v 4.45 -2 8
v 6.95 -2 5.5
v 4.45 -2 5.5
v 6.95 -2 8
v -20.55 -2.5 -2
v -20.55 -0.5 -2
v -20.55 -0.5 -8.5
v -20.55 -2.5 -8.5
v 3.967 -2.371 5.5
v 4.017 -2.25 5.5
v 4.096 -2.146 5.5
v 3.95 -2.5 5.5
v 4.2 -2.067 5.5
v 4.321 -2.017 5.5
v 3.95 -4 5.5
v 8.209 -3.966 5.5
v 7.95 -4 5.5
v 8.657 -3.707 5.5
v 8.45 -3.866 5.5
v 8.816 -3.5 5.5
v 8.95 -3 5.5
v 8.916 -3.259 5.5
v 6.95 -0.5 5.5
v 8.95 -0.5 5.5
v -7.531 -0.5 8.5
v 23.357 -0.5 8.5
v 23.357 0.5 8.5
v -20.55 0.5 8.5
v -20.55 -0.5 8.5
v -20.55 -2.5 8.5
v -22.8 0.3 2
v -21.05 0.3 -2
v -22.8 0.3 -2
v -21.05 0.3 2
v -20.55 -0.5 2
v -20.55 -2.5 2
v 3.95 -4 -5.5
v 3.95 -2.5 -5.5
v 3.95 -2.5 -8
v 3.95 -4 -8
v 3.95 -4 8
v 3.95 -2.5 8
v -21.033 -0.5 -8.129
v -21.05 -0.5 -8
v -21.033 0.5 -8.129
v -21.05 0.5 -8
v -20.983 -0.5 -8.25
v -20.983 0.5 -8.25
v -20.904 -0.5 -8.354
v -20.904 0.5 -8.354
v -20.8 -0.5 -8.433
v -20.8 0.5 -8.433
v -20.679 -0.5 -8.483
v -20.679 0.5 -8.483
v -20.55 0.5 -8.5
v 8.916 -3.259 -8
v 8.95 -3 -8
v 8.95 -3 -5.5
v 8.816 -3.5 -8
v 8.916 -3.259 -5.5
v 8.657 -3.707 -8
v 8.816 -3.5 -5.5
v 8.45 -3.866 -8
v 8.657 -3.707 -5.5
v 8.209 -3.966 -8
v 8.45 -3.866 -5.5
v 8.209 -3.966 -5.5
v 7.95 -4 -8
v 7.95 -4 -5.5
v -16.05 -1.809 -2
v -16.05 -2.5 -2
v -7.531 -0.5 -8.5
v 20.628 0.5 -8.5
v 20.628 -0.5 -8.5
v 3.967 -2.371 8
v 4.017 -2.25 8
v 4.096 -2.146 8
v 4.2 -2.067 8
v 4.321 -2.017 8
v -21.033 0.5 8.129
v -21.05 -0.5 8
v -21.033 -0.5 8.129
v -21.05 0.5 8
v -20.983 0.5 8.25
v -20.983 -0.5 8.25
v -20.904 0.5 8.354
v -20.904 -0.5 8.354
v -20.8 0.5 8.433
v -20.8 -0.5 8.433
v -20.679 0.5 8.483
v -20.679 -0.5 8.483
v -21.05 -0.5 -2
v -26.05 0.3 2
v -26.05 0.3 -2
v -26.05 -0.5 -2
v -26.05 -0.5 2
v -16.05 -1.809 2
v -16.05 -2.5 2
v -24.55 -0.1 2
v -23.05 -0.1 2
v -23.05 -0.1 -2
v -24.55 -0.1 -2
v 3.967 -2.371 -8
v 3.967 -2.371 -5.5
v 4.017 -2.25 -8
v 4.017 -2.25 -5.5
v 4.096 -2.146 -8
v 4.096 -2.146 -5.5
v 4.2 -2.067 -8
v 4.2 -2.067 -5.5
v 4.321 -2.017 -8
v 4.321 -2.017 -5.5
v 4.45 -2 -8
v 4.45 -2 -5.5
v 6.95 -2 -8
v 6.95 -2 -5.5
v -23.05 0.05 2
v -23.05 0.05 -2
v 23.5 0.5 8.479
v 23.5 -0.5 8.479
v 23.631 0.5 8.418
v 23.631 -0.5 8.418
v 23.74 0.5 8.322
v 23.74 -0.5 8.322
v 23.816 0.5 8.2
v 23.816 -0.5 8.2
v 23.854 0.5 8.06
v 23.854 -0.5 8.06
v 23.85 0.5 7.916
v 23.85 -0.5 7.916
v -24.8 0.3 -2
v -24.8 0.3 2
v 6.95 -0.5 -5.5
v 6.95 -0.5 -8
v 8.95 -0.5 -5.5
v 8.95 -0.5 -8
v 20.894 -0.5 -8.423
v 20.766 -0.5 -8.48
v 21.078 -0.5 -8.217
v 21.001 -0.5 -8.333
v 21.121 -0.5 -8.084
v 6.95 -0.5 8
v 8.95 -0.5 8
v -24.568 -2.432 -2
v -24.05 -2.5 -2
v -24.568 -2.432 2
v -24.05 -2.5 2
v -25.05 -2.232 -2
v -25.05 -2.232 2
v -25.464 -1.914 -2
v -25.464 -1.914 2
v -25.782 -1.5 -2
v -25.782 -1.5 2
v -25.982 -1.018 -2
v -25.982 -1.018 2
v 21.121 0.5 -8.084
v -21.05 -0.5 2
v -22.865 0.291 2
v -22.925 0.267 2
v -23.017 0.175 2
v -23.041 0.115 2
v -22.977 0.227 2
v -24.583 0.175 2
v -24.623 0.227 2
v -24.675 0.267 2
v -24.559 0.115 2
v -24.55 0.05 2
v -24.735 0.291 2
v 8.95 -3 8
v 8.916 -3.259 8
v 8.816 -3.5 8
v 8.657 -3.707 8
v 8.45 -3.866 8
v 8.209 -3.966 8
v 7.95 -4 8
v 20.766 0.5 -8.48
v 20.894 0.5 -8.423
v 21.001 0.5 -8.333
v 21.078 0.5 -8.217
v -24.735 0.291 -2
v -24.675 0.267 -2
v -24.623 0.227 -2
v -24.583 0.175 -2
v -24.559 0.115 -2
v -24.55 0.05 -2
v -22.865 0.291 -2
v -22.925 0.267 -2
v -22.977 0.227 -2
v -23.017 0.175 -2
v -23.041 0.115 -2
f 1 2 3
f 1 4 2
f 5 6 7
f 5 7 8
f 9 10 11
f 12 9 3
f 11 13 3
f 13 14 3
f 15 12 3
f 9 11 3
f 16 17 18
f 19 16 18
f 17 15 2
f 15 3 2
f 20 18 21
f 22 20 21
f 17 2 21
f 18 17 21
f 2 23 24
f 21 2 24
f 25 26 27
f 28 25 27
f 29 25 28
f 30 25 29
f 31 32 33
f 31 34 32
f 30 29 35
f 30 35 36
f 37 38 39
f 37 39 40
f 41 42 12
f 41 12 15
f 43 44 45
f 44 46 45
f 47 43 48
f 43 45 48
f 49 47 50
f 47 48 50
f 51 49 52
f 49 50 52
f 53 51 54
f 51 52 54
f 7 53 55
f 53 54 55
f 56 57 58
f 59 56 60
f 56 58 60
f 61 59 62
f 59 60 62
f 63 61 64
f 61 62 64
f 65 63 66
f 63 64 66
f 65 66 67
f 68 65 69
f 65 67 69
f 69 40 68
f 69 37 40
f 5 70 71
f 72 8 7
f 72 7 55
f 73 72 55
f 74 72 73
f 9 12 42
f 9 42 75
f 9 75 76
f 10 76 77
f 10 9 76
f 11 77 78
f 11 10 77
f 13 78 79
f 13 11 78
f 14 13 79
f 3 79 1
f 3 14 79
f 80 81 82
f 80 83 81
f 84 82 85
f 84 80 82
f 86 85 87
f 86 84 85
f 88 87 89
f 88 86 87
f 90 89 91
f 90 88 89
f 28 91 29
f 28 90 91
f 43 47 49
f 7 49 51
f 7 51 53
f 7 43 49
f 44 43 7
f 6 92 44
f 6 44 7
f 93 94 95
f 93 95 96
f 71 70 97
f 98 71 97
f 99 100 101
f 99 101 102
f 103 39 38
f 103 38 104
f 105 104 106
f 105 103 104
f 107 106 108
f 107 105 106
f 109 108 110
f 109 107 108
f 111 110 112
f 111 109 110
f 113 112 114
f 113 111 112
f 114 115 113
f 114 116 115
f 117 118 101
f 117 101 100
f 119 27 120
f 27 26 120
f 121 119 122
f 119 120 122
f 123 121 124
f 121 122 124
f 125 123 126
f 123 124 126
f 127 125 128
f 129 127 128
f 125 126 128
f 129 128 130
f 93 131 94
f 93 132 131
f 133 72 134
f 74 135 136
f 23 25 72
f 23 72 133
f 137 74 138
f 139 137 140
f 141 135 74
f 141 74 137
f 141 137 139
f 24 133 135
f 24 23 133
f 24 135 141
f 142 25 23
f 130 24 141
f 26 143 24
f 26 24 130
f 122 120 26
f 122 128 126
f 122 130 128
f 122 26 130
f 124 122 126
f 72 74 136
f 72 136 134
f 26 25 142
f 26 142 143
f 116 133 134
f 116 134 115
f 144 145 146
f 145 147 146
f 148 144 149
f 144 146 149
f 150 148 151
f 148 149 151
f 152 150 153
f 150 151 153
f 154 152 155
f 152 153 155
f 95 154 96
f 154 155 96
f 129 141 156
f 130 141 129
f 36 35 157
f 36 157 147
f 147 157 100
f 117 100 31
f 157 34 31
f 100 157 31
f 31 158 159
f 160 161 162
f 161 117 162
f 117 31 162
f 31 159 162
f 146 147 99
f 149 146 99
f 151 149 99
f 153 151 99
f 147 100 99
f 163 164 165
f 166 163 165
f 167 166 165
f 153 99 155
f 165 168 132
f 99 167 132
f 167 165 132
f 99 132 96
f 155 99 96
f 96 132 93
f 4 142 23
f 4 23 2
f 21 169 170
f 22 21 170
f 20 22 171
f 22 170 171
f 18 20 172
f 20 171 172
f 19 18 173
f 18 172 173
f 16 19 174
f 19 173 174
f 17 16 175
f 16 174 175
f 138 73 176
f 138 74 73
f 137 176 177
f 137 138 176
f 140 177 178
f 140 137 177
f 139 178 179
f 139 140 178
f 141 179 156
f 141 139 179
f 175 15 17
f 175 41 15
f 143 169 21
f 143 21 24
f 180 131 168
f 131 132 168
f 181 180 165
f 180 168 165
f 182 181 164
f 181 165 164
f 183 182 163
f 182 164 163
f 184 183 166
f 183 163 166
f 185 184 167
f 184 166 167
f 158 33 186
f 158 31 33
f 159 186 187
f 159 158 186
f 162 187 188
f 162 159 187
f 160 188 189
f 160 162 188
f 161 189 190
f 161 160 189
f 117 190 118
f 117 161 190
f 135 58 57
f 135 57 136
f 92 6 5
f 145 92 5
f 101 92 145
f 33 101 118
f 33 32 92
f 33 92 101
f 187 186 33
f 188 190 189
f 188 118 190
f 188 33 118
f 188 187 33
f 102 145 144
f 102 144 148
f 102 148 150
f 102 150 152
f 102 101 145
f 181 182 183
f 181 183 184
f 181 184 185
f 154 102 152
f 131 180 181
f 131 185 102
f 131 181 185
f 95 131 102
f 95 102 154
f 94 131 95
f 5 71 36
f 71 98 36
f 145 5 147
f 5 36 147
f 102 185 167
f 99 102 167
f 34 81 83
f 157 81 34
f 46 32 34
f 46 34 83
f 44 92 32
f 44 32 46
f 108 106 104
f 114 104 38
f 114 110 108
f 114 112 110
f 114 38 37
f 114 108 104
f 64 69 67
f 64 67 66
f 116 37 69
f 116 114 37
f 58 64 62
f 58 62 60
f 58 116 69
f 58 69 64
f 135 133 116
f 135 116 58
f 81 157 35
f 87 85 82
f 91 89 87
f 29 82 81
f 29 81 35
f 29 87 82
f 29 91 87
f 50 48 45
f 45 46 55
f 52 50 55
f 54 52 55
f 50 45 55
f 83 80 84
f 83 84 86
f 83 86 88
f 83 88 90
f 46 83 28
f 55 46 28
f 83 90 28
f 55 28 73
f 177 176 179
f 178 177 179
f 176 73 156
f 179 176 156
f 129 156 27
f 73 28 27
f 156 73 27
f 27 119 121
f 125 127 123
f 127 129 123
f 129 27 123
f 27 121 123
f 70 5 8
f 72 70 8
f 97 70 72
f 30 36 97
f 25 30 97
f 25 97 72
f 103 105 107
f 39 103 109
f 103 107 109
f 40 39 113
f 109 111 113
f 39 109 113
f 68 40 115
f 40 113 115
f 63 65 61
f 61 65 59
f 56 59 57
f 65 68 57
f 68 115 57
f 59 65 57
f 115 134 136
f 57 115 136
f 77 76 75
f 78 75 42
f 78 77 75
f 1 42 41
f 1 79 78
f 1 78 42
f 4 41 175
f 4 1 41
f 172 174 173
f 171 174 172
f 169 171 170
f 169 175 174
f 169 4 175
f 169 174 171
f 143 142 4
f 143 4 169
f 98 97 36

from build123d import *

# Parameters (mm, degrees)
F0_W      = 14
F0_H      = 11
F1_DEPTH  = 0.5
F3_START  = -0.6
F2_W      = 1.5
F2_H      = 4
F2_W_2    = 2
F2_W_3    = 5
F3_DEPTH  = 2.4
F5_START  = -0.2
F5_DEPTH  = 0.4
F6_DEPTH  = 8
F7_R      = 0.5
F8_R      = 1
F9_R      = 0.5
F10_R     = 2
F11_R     = 0.25
F12_START = 0.5
F12_DEPTH = 3.5
F14_DEPTH = 8.5


# Not quite as in the source:
# - a feature names something its author has since deleted; it is built from what else it names


with BuildPart() as f1:
    # F0 (on Front) → F1 (new body, symmetric)
    with BuildSketch(Plane.XZ):
        Polygon((-21.05, -8.5), (21.05, -8.5), (23.95, 8.5), (-21.05, 8.5), align=None)
        with Locations((7.95, 0)):
            Rectangle(F0_W, F0_H, mode=Mode.SUBTRACT)
        with Locations((7.95, 0)):
            Rectangle(F0_W, F0_H)
    extrude(amount=F1_DEPTH, both=True)

    # F2 (on face) → F3 (join)
    with BuildSketch(Plane(origin=(0, 0.5, 0), x_dir=(-1, 0, 0), z_dir=(0, 1, 0)).offset(F3_START)):
        with Locations((25.3, 0)):
            Rectangle(F2_W, F2_H)
        with Locations((22.05, 0)):
            Rectangle(F2_W_2, F2_H)
        with Locations((23.8, 0)):
            Rectangle(F2_W, F2_H)
        with Locations((18.55, 0)):
            Rectangle(F2_W_3, F2_H)
    extrude(amount=-F3_DEPTH)

    # F2 (on face) → F5 (join)
    with BuildSketch(Plane(origin=(0, 0.5, 0), x_dir=(-1, 0, 0), z_dir=(0, 1, 0)).offset(F5_START)):
        with Locations((25.3, 0)):
            Rectangle(F2_W, F2_H)
        with Locations((22.05, 0)):
            Rectangle(F2_W_2, F2_H)
    extrude(amount=-F5_DEPTH)

    # F4 (on Top) → F6 (join, symmetric)
    with BuildSketch(Plane.XY):
        Polygon((3.95, -4), (8.95, -4), (8.95, -0.5), (6.95, -0.5), (6.95, -2), (3.95, -2), align=None)
    extrude(amount=F6_DEPTH, both=True)

    # F7
    f7_edges = [f1.edges().sort_by_distance(p)[0] for p in [
        (-21.05, 0, 8.5),
        (-21.05, 0, -8.5),
        (23.95, 0, 8.5),
        (21.05, 0, -8.5),
    ]]
    fillet(f7_edges, radius=F7_R)

    # F8
    f8_edges = [f1.edges().sort_by_distance(p)[0] for p in [
        (8.95, -4, 0),
    ]]
    fillet(f8_edges, radius=F8_R)

    # F9
    f9_edges = [f1.edges().sort_by_distance(p)[0] for p in [
        (3.95, -2, 0),
    ]]
    fillet(f9_edges, radius=F9_R)

    # F10
    f10_edges = [f1.edges().sort_by_distance(p)[0] for p in [
        (-26.05, -2.5, 0),
    ]]
    fillet(f10_edges, radius=F10_R)

    # F11
    f11_edges = [f1.edges().sort_by_distance(p)[0] for p in [
        (-24.55, 0.3, 0),
        (-23.05, 0.3, 0),
    ]]
    fillet(f11_edges, radius=F11_R)

    # F0 (on Front) → F12 (cut)
    with BuildSketch(Plane.XZ.offset(F12_START)):
        with Locations((7.95, 0)):
            Rectangle(F0_W, F0_H)
    extrude(amount=F12_DEPTH, mode=Mode.SUBTRACT)

    # F13 (on Top) → F14 (join, symmetric)
    with BuildSketch(Plane.XY):
        Polygon((-4.276, 0), (-20.55, 0), (-20.55, -2.5), align=None)
    extrude(amount=F14_DEPTH, both=True)


solid = f1.part
